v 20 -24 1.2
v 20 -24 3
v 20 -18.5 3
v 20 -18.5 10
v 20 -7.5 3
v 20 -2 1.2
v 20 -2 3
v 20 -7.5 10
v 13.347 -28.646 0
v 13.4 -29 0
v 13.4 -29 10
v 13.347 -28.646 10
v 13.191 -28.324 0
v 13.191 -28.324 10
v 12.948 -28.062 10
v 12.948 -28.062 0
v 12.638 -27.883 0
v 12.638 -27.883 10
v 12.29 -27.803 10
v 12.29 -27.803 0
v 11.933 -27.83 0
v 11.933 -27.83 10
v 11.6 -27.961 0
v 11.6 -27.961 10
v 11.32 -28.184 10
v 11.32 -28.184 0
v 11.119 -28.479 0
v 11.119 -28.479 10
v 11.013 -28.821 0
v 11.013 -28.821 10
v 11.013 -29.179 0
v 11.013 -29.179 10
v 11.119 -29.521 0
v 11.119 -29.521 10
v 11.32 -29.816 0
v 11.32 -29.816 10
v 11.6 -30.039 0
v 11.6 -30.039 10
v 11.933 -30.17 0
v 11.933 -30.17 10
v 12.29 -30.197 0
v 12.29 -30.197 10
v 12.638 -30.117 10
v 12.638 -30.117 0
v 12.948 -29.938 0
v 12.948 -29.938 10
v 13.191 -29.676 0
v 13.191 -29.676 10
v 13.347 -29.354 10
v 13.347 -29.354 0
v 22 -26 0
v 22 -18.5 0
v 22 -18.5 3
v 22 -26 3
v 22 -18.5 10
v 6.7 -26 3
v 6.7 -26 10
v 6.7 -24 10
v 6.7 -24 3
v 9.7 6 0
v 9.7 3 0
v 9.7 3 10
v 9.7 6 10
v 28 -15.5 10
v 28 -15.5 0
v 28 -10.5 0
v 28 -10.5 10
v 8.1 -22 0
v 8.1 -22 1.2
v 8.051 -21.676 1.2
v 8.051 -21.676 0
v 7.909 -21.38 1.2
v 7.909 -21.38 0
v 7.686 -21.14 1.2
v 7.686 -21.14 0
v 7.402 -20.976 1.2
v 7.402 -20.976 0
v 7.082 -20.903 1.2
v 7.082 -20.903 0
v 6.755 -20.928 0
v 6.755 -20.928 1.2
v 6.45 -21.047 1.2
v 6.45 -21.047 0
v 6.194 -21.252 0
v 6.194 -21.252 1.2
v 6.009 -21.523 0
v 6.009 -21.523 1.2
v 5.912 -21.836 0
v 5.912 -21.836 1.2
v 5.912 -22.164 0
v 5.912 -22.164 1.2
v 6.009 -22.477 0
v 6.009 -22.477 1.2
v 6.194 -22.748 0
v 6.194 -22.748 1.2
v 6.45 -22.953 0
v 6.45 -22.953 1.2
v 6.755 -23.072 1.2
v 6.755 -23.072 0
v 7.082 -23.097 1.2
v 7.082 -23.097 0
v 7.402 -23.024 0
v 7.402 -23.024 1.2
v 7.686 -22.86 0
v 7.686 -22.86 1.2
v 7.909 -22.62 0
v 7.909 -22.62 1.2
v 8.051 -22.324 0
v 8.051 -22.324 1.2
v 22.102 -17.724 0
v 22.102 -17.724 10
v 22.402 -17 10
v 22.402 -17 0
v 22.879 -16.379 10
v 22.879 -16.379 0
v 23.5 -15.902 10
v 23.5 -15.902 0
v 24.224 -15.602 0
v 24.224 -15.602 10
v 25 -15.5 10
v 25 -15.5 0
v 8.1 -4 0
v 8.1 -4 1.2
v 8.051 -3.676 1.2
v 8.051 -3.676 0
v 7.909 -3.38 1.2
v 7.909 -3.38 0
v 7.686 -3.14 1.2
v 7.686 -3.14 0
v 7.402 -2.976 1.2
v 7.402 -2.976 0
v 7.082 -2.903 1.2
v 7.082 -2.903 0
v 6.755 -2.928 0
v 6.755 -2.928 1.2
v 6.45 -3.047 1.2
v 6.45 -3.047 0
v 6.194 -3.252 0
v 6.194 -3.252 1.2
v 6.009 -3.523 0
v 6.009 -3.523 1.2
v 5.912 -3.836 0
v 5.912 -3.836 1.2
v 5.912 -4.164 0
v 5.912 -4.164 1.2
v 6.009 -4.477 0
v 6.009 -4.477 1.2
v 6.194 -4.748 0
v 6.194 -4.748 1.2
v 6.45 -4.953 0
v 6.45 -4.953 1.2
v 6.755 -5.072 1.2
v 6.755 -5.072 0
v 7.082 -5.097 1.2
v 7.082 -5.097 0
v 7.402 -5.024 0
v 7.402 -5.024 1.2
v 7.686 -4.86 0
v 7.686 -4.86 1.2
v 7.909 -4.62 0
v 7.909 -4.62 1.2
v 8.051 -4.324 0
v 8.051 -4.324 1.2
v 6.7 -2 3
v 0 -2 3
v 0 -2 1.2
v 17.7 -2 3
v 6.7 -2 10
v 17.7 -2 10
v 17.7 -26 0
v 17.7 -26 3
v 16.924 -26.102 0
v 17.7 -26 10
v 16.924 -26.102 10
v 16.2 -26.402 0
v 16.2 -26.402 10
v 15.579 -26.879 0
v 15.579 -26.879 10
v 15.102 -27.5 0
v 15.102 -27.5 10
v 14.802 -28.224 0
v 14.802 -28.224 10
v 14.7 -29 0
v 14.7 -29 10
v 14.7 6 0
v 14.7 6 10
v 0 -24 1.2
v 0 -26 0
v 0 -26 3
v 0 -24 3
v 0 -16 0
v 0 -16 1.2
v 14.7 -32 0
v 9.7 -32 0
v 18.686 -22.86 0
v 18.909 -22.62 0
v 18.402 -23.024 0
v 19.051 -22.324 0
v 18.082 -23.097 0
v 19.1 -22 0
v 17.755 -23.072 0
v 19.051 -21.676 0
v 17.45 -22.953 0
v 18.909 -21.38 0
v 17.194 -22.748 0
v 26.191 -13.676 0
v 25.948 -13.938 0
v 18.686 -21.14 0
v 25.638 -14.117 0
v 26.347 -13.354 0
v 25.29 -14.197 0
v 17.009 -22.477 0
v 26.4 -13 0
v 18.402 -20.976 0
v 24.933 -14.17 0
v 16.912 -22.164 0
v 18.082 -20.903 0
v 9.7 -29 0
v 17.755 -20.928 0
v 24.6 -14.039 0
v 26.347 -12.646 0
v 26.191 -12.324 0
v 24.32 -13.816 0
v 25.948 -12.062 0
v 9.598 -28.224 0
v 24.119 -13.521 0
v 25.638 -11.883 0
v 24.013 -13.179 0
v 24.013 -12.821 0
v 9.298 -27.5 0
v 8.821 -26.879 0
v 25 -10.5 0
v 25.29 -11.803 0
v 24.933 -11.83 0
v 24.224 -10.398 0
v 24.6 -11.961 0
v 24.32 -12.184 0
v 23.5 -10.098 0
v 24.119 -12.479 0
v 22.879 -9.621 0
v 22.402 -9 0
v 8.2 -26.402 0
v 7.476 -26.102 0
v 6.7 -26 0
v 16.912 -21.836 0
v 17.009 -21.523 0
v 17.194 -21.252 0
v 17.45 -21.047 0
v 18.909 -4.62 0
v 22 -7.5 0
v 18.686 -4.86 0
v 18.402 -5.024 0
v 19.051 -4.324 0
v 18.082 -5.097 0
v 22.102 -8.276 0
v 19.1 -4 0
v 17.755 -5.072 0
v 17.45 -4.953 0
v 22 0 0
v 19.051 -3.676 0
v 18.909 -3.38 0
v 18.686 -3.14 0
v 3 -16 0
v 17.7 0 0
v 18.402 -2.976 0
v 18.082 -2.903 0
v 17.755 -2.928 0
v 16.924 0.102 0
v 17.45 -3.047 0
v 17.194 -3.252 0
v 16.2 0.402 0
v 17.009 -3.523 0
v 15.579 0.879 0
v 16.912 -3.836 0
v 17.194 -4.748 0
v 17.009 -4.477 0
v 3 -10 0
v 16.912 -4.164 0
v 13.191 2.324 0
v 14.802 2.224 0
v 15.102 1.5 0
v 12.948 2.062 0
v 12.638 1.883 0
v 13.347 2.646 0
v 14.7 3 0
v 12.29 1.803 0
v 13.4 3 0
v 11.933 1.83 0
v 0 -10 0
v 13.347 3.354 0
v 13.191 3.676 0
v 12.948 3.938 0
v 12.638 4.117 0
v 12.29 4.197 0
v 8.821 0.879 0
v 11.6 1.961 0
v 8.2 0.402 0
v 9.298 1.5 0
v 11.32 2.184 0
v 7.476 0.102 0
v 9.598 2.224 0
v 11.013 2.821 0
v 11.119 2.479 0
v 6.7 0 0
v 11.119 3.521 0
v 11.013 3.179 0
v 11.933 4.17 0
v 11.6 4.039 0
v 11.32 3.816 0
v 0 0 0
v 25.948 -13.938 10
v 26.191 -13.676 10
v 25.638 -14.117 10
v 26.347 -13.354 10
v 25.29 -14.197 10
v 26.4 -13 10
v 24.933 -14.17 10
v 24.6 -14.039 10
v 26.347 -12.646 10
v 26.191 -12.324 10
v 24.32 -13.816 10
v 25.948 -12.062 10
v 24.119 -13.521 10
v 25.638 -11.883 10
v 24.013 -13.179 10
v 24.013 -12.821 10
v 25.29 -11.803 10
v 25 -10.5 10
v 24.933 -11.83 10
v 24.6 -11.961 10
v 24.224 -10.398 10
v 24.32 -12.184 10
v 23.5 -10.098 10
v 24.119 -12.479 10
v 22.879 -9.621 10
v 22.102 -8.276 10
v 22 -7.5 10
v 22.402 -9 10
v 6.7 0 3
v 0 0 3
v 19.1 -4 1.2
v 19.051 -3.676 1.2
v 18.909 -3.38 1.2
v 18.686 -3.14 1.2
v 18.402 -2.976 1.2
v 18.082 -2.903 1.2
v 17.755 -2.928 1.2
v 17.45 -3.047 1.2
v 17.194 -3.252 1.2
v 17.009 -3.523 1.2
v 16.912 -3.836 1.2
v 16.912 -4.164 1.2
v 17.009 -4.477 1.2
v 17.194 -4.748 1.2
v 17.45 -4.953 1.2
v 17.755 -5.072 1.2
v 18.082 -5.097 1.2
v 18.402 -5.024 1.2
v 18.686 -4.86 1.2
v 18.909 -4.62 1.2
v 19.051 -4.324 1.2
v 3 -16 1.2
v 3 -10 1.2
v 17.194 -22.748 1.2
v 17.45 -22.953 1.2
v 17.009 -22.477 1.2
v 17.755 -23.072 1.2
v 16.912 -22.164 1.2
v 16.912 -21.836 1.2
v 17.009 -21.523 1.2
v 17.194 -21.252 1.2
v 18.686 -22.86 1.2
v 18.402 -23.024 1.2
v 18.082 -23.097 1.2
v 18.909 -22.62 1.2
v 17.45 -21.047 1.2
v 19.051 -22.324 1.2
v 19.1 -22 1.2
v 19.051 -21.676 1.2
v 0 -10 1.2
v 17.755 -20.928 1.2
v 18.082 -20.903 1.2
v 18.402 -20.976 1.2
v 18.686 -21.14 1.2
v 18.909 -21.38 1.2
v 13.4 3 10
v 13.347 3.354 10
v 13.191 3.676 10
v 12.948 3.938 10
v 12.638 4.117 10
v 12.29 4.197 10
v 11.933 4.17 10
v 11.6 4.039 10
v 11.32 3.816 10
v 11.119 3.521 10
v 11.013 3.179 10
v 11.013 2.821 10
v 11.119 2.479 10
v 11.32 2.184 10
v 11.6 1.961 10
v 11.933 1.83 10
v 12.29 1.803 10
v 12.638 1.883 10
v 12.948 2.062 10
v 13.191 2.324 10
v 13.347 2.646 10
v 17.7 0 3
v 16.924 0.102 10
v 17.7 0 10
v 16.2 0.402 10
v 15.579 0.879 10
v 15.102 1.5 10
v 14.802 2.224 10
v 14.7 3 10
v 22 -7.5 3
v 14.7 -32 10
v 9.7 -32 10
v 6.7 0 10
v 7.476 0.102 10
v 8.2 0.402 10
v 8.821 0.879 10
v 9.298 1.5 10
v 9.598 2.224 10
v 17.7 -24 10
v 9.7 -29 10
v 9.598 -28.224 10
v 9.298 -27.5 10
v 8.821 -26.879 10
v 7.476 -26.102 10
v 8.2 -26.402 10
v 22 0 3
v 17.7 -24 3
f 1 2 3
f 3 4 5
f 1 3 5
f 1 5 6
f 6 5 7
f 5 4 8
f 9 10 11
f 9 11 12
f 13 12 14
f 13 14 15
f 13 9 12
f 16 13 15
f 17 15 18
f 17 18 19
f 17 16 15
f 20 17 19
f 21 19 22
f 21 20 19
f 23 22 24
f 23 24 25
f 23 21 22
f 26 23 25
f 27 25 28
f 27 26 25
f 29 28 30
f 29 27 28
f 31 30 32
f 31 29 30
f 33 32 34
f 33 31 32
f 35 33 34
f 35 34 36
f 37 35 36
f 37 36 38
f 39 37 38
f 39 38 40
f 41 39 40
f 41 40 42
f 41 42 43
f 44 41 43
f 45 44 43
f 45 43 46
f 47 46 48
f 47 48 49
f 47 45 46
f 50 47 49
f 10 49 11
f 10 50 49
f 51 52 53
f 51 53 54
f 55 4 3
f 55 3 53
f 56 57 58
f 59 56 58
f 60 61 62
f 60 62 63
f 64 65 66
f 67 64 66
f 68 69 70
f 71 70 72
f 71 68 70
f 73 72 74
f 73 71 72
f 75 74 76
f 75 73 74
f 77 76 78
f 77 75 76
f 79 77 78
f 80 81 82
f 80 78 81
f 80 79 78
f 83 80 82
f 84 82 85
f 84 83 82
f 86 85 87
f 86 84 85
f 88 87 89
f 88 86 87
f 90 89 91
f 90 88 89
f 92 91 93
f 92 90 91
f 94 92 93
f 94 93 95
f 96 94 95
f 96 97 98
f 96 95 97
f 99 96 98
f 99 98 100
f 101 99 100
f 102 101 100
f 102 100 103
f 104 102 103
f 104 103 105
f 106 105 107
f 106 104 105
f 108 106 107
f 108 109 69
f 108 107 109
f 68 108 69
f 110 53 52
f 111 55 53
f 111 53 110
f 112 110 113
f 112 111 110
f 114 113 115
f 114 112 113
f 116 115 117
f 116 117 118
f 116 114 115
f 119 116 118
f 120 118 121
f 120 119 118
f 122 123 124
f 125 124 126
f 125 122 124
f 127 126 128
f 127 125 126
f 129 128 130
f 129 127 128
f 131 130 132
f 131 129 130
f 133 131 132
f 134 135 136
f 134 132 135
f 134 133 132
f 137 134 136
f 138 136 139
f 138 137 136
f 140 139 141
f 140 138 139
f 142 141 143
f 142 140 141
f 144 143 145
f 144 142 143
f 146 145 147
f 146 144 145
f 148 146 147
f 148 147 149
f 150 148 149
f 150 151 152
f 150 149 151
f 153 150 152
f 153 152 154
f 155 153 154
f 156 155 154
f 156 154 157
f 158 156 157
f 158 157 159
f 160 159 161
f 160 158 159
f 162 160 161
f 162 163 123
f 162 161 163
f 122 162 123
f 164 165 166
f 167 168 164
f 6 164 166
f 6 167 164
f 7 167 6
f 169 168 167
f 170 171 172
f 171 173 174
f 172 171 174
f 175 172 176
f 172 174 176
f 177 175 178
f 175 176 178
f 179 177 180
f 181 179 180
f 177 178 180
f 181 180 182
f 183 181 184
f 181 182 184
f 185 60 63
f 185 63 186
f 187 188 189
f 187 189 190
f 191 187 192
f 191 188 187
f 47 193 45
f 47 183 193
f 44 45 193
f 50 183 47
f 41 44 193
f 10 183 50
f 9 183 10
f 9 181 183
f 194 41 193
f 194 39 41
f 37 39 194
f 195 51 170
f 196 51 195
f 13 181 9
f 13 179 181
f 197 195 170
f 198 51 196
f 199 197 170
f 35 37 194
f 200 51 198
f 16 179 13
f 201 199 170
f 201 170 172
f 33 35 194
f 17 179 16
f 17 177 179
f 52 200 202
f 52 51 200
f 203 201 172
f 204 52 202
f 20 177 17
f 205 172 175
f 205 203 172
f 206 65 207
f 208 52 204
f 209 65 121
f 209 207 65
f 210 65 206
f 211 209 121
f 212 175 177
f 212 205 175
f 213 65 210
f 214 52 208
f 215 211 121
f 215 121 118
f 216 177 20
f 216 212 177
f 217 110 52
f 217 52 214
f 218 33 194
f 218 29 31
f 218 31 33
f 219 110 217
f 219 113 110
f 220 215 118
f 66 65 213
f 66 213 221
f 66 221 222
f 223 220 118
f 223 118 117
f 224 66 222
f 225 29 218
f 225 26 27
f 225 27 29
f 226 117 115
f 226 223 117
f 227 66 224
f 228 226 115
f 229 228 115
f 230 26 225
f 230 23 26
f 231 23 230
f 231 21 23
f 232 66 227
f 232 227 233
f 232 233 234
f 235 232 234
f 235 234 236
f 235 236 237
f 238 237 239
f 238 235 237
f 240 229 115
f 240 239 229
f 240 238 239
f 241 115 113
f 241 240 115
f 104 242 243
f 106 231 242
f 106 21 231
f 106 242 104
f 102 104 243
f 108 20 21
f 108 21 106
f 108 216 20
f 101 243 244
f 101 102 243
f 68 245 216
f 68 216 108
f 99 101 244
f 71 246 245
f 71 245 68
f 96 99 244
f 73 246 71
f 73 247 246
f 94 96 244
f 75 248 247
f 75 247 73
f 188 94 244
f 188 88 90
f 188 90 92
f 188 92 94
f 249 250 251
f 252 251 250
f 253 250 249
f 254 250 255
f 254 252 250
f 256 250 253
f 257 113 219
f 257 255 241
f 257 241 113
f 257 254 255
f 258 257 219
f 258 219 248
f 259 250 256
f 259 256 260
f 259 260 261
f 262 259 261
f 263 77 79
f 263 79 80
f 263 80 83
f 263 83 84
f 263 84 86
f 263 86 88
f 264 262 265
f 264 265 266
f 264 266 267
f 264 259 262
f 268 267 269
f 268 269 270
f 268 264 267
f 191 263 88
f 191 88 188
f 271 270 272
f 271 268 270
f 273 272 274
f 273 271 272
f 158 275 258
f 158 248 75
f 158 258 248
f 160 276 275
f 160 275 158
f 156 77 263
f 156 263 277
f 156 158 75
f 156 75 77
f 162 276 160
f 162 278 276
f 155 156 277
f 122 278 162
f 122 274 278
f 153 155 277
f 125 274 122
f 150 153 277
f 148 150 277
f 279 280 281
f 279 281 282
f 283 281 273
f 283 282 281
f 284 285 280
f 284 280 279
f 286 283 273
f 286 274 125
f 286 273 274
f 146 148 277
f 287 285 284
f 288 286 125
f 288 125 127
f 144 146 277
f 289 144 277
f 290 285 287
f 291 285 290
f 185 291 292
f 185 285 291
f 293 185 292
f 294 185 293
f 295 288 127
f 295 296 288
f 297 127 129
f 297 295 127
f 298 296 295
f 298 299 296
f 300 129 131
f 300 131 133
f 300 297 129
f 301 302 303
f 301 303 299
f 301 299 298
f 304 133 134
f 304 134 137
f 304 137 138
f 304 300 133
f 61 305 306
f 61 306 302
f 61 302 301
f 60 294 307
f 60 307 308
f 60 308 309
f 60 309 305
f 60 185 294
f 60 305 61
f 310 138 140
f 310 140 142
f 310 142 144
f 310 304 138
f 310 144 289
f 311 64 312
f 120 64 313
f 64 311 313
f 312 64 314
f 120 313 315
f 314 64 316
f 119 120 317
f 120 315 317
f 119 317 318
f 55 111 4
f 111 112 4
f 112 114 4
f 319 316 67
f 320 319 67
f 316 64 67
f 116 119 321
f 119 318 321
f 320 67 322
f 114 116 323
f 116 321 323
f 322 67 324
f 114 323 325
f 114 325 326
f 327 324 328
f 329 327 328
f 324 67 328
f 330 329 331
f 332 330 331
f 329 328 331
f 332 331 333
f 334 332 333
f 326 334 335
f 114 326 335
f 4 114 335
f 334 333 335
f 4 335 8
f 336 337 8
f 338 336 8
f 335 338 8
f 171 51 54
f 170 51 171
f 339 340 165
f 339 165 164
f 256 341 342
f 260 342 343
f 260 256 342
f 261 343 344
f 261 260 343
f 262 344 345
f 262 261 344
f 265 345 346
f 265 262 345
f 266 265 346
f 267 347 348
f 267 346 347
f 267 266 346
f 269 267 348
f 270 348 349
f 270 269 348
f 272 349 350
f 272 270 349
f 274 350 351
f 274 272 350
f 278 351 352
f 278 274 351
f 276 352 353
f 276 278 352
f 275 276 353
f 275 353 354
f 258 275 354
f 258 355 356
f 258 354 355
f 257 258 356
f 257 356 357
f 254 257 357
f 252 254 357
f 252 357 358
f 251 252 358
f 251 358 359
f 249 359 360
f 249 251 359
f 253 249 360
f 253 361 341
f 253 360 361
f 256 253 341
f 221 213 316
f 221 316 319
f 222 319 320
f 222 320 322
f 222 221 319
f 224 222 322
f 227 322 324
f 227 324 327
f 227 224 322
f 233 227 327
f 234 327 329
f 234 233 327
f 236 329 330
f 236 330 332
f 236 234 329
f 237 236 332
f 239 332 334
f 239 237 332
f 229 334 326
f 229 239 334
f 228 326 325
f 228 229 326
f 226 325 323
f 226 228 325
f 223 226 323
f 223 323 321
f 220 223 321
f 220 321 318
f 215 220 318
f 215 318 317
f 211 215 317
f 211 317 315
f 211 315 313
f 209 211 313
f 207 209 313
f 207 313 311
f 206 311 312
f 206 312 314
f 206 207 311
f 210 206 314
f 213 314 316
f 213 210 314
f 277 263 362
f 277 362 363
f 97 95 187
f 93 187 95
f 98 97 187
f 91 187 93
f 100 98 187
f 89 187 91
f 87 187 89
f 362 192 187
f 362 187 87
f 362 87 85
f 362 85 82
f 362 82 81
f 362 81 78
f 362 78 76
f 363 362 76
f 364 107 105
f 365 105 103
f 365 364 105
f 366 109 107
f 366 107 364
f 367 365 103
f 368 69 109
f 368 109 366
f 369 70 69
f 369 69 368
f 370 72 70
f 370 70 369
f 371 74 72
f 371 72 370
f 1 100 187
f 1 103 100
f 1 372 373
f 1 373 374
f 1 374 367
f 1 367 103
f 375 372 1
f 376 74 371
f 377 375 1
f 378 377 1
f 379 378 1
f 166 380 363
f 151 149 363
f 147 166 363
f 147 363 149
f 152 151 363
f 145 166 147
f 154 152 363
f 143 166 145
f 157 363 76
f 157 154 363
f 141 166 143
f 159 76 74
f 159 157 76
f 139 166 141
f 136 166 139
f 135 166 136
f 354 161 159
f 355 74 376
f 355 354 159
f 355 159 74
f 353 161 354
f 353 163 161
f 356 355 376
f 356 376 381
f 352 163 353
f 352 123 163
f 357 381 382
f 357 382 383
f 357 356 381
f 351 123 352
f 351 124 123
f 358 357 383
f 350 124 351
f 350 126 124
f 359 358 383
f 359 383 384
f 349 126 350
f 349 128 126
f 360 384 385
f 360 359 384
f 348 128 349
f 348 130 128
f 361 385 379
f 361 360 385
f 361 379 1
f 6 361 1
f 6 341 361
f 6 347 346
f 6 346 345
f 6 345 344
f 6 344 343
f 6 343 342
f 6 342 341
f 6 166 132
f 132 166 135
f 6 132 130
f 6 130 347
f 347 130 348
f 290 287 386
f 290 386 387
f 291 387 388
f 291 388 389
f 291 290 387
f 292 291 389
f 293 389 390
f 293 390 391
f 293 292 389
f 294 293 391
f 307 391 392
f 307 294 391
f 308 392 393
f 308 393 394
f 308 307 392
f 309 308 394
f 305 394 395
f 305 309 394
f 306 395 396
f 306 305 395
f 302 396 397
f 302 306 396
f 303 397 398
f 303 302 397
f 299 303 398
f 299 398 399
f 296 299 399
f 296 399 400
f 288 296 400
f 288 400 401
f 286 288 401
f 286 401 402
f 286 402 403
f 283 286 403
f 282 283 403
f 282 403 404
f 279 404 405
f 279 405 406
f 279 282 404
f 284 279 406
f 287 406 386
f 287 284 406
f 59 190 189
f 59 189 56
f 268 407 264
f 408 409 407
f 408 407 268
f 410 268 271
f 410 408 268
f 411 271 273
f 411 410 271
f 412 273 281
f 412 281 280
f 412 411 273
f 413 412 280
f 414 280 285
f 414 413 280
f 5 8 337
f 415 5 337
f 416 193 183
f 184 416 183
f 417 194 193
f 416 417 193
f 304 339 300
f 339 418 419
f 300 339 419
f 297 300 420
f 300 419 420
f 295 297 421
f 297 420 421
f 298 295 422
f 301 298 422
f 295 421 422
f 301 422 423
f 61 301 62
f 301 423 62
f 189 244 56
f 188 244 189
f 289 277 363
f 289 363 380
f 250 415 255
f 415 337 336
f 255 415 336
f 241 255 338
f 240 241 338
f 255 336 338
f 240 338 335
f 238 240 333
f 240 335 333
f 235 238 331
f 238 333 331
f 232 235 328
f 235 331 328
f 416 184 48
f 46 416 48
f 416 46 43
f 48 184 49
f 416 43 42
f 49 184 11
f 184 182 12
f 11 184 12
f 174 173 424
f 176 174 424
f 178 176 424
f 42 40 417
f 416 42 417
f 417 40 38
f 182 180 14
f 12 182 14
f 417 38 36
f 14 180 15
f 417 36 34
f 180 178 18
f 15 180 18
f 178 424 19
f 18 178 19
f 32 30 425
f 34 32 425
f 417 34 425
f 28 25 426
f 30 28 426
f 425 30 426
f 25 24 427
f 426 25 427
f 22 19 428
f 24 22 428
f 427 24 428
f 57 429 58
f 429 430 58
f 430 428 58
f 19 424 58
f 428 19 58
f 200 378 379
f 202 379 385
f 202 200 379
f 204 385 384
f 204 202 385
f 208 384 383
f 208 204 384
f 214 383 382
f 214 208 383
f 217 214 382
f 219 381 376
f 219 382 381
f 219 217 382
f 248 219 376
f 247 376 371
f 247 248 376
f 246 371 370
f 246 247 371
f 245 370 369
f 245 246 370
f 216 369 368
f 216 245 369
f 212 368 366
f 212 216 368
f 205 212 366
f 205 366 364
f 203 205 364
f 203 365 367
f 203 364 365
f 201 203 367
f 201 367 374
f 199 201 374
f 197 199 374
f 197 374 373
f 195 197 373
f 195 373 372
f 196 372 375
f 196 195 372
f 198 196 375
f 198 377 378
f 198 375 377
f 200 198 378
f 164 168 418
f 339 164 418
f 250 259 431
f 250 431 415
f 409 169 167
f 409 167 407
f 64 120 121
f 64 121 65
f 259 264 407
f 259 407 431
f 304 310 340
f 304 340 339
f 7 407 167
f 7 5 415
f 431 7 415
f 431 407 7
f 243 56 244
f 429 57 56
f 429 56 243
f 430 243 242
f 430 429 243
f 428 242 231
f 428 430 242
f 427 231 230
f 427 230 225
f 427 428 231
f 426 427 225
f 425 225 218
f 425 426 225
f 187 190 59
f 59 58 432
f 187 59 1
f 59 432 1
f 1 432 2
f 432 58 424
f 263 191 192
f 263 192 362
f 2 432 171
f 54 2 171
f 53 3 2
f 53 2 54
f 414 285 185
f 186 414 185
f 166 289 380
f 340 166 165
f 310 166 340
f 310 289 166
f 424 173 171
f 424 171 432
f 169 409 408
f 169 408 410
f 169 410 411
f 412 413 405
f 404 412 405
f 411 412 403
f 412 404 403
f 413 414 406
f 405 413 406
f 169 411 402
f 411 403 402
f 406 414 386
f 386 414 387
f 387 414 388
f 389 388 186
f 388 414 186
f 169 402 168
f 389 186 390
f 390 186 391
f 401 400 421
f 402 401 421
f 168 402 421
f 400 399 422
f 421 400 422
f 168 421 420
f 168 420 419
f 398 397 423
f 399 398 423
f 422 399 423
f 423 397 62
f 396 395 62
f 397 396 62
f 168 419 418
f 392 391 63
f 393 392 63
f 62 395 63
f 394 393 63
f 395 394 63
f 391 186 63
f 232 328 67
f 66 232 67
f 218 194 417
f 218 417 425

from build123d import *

# Parameters (mm, degrees)
SKETCH1_R           = 1.1
SKETCH1_W           = 5
SKETCH1_H           = 6
SKETCH1_R_2         = 1.2
SKETCH1_W_2         = 6
SKETCH1_H_2         = 5
BOSS_EXTRUDE1_DEPTH = 10
FILLET1_R           = 3
SKETCH2_W           = 28
SKETCH2_H           = 22
CUT_EXTRUDE1_DEPTH  = 8.8
SKETCH3_W           = 6.7
SKETCH3_H           = 26
SKETCH3_W_2         = 4.3
SKETCH3_H_2         = 7.5
CUT_EXTRUDE2_DEPTH  = 7


with BuildPart() as part:
    # Sketch1 → Boss-Extrude1 (new body)
    # profile 1 of 4: a face of its own
    with BuildSketch(Plane.XY):
        Polygon((0, 0), (22, 0), (22, -26), (0, -26), (0, -16), (3, -16), (3, -10), (0, -10), align=None)
        with Locations((18, -4)):
            Circle(SKETCH1_R, mode=Mode.SUBTRACT)
        with Locations((7, -4)):
            Circle(SKETCH1_R, mode=Mode.SUBTRACT)
        with Locations((7, -22)):
            Circle(SKETCH1_R, mode=Mode.SUBTRACT)
        with Locations((18, -22)):
            Circle(SKETCH1_R, mode=Mode.SUBTRACT)
    # profile 2 of 4: a face of its own
    with BuildSketch(Plane.XY):
        with Locations((12.2, 3)):
            Rectangle(SKETCH1_W, SKETCH1_H)
        with Locations((12.2, 3)):
            Circle(SKETCH1_R_2, mode=Mode.SUBTRACT)
    # profile 3 of 4: a face of its own
    with BuildSketch(Plane.XY):
        with Locations((25, -13)):
            Rectangle(SKETCH1_W_2, SKETCH1_H_2)
        with Locations((25.2, -13)):
            Circle(SKETCH1_R_2, mode=Mode.SUBTRACT)
    # profile 4 of 4: a face of its own
    with BuildSketch(Plane.XY):
        with Locations((12.2, -29)):
            Rectangle(SKETCH1_W, SKETCH1_H)
        with Locations((12.2, -29)):
            Circle(SKETCH1_R_2, mode=Mode.SUBTRACT)
    extrude(amount=BOSS_EXTRUDE1_DEPTH)

    # Fillet1
    fillet1_edges = [part.edges().sort_by_distance(p)[0] for p in [
        (9.7, 0, 5),
        (14.7, 0, 5),
        (22, -10.5, 5),
        (22, -15.5, 5),
        (14.7, -26, 5),
        (9.7, -26, 5),
    ]]
    fillet(fillet1_edges, radius=FILLET1_R)

    # Sketch2 → Cut-Extrude1 (cut)
    with BuildSketch(Plane.XY.offset(10)):
        with Locations((6, -13)):
            Rectangle(SKETCH2_W, SKETCH2_H)
    extrude(amount=-CUT_EXTRUDE1_DEPTH, mode=Mode.SUBTRACT)

    # Sketch3 → Cut-Extrude2 (cut)
    with BuildSketch(Plane.XY.offset(10)):
        with Locations((3.35, -13)):
            Rectangle(SKETCH3_W, SKETCH3_H)
        with Locations((19.85, -3.75)):
            Rectangle(SKETCH3_W_2, SKETCH3_H_2)
        with Locations((19.85, -22.25)):
            Rectangle(SKETCH3_W_2, SKETCH3_H_2)
    extrude(amount=-CUT_EXTRUDE2_DEPTH, mode=Mode.SUBTRACT)


solid = part.part
